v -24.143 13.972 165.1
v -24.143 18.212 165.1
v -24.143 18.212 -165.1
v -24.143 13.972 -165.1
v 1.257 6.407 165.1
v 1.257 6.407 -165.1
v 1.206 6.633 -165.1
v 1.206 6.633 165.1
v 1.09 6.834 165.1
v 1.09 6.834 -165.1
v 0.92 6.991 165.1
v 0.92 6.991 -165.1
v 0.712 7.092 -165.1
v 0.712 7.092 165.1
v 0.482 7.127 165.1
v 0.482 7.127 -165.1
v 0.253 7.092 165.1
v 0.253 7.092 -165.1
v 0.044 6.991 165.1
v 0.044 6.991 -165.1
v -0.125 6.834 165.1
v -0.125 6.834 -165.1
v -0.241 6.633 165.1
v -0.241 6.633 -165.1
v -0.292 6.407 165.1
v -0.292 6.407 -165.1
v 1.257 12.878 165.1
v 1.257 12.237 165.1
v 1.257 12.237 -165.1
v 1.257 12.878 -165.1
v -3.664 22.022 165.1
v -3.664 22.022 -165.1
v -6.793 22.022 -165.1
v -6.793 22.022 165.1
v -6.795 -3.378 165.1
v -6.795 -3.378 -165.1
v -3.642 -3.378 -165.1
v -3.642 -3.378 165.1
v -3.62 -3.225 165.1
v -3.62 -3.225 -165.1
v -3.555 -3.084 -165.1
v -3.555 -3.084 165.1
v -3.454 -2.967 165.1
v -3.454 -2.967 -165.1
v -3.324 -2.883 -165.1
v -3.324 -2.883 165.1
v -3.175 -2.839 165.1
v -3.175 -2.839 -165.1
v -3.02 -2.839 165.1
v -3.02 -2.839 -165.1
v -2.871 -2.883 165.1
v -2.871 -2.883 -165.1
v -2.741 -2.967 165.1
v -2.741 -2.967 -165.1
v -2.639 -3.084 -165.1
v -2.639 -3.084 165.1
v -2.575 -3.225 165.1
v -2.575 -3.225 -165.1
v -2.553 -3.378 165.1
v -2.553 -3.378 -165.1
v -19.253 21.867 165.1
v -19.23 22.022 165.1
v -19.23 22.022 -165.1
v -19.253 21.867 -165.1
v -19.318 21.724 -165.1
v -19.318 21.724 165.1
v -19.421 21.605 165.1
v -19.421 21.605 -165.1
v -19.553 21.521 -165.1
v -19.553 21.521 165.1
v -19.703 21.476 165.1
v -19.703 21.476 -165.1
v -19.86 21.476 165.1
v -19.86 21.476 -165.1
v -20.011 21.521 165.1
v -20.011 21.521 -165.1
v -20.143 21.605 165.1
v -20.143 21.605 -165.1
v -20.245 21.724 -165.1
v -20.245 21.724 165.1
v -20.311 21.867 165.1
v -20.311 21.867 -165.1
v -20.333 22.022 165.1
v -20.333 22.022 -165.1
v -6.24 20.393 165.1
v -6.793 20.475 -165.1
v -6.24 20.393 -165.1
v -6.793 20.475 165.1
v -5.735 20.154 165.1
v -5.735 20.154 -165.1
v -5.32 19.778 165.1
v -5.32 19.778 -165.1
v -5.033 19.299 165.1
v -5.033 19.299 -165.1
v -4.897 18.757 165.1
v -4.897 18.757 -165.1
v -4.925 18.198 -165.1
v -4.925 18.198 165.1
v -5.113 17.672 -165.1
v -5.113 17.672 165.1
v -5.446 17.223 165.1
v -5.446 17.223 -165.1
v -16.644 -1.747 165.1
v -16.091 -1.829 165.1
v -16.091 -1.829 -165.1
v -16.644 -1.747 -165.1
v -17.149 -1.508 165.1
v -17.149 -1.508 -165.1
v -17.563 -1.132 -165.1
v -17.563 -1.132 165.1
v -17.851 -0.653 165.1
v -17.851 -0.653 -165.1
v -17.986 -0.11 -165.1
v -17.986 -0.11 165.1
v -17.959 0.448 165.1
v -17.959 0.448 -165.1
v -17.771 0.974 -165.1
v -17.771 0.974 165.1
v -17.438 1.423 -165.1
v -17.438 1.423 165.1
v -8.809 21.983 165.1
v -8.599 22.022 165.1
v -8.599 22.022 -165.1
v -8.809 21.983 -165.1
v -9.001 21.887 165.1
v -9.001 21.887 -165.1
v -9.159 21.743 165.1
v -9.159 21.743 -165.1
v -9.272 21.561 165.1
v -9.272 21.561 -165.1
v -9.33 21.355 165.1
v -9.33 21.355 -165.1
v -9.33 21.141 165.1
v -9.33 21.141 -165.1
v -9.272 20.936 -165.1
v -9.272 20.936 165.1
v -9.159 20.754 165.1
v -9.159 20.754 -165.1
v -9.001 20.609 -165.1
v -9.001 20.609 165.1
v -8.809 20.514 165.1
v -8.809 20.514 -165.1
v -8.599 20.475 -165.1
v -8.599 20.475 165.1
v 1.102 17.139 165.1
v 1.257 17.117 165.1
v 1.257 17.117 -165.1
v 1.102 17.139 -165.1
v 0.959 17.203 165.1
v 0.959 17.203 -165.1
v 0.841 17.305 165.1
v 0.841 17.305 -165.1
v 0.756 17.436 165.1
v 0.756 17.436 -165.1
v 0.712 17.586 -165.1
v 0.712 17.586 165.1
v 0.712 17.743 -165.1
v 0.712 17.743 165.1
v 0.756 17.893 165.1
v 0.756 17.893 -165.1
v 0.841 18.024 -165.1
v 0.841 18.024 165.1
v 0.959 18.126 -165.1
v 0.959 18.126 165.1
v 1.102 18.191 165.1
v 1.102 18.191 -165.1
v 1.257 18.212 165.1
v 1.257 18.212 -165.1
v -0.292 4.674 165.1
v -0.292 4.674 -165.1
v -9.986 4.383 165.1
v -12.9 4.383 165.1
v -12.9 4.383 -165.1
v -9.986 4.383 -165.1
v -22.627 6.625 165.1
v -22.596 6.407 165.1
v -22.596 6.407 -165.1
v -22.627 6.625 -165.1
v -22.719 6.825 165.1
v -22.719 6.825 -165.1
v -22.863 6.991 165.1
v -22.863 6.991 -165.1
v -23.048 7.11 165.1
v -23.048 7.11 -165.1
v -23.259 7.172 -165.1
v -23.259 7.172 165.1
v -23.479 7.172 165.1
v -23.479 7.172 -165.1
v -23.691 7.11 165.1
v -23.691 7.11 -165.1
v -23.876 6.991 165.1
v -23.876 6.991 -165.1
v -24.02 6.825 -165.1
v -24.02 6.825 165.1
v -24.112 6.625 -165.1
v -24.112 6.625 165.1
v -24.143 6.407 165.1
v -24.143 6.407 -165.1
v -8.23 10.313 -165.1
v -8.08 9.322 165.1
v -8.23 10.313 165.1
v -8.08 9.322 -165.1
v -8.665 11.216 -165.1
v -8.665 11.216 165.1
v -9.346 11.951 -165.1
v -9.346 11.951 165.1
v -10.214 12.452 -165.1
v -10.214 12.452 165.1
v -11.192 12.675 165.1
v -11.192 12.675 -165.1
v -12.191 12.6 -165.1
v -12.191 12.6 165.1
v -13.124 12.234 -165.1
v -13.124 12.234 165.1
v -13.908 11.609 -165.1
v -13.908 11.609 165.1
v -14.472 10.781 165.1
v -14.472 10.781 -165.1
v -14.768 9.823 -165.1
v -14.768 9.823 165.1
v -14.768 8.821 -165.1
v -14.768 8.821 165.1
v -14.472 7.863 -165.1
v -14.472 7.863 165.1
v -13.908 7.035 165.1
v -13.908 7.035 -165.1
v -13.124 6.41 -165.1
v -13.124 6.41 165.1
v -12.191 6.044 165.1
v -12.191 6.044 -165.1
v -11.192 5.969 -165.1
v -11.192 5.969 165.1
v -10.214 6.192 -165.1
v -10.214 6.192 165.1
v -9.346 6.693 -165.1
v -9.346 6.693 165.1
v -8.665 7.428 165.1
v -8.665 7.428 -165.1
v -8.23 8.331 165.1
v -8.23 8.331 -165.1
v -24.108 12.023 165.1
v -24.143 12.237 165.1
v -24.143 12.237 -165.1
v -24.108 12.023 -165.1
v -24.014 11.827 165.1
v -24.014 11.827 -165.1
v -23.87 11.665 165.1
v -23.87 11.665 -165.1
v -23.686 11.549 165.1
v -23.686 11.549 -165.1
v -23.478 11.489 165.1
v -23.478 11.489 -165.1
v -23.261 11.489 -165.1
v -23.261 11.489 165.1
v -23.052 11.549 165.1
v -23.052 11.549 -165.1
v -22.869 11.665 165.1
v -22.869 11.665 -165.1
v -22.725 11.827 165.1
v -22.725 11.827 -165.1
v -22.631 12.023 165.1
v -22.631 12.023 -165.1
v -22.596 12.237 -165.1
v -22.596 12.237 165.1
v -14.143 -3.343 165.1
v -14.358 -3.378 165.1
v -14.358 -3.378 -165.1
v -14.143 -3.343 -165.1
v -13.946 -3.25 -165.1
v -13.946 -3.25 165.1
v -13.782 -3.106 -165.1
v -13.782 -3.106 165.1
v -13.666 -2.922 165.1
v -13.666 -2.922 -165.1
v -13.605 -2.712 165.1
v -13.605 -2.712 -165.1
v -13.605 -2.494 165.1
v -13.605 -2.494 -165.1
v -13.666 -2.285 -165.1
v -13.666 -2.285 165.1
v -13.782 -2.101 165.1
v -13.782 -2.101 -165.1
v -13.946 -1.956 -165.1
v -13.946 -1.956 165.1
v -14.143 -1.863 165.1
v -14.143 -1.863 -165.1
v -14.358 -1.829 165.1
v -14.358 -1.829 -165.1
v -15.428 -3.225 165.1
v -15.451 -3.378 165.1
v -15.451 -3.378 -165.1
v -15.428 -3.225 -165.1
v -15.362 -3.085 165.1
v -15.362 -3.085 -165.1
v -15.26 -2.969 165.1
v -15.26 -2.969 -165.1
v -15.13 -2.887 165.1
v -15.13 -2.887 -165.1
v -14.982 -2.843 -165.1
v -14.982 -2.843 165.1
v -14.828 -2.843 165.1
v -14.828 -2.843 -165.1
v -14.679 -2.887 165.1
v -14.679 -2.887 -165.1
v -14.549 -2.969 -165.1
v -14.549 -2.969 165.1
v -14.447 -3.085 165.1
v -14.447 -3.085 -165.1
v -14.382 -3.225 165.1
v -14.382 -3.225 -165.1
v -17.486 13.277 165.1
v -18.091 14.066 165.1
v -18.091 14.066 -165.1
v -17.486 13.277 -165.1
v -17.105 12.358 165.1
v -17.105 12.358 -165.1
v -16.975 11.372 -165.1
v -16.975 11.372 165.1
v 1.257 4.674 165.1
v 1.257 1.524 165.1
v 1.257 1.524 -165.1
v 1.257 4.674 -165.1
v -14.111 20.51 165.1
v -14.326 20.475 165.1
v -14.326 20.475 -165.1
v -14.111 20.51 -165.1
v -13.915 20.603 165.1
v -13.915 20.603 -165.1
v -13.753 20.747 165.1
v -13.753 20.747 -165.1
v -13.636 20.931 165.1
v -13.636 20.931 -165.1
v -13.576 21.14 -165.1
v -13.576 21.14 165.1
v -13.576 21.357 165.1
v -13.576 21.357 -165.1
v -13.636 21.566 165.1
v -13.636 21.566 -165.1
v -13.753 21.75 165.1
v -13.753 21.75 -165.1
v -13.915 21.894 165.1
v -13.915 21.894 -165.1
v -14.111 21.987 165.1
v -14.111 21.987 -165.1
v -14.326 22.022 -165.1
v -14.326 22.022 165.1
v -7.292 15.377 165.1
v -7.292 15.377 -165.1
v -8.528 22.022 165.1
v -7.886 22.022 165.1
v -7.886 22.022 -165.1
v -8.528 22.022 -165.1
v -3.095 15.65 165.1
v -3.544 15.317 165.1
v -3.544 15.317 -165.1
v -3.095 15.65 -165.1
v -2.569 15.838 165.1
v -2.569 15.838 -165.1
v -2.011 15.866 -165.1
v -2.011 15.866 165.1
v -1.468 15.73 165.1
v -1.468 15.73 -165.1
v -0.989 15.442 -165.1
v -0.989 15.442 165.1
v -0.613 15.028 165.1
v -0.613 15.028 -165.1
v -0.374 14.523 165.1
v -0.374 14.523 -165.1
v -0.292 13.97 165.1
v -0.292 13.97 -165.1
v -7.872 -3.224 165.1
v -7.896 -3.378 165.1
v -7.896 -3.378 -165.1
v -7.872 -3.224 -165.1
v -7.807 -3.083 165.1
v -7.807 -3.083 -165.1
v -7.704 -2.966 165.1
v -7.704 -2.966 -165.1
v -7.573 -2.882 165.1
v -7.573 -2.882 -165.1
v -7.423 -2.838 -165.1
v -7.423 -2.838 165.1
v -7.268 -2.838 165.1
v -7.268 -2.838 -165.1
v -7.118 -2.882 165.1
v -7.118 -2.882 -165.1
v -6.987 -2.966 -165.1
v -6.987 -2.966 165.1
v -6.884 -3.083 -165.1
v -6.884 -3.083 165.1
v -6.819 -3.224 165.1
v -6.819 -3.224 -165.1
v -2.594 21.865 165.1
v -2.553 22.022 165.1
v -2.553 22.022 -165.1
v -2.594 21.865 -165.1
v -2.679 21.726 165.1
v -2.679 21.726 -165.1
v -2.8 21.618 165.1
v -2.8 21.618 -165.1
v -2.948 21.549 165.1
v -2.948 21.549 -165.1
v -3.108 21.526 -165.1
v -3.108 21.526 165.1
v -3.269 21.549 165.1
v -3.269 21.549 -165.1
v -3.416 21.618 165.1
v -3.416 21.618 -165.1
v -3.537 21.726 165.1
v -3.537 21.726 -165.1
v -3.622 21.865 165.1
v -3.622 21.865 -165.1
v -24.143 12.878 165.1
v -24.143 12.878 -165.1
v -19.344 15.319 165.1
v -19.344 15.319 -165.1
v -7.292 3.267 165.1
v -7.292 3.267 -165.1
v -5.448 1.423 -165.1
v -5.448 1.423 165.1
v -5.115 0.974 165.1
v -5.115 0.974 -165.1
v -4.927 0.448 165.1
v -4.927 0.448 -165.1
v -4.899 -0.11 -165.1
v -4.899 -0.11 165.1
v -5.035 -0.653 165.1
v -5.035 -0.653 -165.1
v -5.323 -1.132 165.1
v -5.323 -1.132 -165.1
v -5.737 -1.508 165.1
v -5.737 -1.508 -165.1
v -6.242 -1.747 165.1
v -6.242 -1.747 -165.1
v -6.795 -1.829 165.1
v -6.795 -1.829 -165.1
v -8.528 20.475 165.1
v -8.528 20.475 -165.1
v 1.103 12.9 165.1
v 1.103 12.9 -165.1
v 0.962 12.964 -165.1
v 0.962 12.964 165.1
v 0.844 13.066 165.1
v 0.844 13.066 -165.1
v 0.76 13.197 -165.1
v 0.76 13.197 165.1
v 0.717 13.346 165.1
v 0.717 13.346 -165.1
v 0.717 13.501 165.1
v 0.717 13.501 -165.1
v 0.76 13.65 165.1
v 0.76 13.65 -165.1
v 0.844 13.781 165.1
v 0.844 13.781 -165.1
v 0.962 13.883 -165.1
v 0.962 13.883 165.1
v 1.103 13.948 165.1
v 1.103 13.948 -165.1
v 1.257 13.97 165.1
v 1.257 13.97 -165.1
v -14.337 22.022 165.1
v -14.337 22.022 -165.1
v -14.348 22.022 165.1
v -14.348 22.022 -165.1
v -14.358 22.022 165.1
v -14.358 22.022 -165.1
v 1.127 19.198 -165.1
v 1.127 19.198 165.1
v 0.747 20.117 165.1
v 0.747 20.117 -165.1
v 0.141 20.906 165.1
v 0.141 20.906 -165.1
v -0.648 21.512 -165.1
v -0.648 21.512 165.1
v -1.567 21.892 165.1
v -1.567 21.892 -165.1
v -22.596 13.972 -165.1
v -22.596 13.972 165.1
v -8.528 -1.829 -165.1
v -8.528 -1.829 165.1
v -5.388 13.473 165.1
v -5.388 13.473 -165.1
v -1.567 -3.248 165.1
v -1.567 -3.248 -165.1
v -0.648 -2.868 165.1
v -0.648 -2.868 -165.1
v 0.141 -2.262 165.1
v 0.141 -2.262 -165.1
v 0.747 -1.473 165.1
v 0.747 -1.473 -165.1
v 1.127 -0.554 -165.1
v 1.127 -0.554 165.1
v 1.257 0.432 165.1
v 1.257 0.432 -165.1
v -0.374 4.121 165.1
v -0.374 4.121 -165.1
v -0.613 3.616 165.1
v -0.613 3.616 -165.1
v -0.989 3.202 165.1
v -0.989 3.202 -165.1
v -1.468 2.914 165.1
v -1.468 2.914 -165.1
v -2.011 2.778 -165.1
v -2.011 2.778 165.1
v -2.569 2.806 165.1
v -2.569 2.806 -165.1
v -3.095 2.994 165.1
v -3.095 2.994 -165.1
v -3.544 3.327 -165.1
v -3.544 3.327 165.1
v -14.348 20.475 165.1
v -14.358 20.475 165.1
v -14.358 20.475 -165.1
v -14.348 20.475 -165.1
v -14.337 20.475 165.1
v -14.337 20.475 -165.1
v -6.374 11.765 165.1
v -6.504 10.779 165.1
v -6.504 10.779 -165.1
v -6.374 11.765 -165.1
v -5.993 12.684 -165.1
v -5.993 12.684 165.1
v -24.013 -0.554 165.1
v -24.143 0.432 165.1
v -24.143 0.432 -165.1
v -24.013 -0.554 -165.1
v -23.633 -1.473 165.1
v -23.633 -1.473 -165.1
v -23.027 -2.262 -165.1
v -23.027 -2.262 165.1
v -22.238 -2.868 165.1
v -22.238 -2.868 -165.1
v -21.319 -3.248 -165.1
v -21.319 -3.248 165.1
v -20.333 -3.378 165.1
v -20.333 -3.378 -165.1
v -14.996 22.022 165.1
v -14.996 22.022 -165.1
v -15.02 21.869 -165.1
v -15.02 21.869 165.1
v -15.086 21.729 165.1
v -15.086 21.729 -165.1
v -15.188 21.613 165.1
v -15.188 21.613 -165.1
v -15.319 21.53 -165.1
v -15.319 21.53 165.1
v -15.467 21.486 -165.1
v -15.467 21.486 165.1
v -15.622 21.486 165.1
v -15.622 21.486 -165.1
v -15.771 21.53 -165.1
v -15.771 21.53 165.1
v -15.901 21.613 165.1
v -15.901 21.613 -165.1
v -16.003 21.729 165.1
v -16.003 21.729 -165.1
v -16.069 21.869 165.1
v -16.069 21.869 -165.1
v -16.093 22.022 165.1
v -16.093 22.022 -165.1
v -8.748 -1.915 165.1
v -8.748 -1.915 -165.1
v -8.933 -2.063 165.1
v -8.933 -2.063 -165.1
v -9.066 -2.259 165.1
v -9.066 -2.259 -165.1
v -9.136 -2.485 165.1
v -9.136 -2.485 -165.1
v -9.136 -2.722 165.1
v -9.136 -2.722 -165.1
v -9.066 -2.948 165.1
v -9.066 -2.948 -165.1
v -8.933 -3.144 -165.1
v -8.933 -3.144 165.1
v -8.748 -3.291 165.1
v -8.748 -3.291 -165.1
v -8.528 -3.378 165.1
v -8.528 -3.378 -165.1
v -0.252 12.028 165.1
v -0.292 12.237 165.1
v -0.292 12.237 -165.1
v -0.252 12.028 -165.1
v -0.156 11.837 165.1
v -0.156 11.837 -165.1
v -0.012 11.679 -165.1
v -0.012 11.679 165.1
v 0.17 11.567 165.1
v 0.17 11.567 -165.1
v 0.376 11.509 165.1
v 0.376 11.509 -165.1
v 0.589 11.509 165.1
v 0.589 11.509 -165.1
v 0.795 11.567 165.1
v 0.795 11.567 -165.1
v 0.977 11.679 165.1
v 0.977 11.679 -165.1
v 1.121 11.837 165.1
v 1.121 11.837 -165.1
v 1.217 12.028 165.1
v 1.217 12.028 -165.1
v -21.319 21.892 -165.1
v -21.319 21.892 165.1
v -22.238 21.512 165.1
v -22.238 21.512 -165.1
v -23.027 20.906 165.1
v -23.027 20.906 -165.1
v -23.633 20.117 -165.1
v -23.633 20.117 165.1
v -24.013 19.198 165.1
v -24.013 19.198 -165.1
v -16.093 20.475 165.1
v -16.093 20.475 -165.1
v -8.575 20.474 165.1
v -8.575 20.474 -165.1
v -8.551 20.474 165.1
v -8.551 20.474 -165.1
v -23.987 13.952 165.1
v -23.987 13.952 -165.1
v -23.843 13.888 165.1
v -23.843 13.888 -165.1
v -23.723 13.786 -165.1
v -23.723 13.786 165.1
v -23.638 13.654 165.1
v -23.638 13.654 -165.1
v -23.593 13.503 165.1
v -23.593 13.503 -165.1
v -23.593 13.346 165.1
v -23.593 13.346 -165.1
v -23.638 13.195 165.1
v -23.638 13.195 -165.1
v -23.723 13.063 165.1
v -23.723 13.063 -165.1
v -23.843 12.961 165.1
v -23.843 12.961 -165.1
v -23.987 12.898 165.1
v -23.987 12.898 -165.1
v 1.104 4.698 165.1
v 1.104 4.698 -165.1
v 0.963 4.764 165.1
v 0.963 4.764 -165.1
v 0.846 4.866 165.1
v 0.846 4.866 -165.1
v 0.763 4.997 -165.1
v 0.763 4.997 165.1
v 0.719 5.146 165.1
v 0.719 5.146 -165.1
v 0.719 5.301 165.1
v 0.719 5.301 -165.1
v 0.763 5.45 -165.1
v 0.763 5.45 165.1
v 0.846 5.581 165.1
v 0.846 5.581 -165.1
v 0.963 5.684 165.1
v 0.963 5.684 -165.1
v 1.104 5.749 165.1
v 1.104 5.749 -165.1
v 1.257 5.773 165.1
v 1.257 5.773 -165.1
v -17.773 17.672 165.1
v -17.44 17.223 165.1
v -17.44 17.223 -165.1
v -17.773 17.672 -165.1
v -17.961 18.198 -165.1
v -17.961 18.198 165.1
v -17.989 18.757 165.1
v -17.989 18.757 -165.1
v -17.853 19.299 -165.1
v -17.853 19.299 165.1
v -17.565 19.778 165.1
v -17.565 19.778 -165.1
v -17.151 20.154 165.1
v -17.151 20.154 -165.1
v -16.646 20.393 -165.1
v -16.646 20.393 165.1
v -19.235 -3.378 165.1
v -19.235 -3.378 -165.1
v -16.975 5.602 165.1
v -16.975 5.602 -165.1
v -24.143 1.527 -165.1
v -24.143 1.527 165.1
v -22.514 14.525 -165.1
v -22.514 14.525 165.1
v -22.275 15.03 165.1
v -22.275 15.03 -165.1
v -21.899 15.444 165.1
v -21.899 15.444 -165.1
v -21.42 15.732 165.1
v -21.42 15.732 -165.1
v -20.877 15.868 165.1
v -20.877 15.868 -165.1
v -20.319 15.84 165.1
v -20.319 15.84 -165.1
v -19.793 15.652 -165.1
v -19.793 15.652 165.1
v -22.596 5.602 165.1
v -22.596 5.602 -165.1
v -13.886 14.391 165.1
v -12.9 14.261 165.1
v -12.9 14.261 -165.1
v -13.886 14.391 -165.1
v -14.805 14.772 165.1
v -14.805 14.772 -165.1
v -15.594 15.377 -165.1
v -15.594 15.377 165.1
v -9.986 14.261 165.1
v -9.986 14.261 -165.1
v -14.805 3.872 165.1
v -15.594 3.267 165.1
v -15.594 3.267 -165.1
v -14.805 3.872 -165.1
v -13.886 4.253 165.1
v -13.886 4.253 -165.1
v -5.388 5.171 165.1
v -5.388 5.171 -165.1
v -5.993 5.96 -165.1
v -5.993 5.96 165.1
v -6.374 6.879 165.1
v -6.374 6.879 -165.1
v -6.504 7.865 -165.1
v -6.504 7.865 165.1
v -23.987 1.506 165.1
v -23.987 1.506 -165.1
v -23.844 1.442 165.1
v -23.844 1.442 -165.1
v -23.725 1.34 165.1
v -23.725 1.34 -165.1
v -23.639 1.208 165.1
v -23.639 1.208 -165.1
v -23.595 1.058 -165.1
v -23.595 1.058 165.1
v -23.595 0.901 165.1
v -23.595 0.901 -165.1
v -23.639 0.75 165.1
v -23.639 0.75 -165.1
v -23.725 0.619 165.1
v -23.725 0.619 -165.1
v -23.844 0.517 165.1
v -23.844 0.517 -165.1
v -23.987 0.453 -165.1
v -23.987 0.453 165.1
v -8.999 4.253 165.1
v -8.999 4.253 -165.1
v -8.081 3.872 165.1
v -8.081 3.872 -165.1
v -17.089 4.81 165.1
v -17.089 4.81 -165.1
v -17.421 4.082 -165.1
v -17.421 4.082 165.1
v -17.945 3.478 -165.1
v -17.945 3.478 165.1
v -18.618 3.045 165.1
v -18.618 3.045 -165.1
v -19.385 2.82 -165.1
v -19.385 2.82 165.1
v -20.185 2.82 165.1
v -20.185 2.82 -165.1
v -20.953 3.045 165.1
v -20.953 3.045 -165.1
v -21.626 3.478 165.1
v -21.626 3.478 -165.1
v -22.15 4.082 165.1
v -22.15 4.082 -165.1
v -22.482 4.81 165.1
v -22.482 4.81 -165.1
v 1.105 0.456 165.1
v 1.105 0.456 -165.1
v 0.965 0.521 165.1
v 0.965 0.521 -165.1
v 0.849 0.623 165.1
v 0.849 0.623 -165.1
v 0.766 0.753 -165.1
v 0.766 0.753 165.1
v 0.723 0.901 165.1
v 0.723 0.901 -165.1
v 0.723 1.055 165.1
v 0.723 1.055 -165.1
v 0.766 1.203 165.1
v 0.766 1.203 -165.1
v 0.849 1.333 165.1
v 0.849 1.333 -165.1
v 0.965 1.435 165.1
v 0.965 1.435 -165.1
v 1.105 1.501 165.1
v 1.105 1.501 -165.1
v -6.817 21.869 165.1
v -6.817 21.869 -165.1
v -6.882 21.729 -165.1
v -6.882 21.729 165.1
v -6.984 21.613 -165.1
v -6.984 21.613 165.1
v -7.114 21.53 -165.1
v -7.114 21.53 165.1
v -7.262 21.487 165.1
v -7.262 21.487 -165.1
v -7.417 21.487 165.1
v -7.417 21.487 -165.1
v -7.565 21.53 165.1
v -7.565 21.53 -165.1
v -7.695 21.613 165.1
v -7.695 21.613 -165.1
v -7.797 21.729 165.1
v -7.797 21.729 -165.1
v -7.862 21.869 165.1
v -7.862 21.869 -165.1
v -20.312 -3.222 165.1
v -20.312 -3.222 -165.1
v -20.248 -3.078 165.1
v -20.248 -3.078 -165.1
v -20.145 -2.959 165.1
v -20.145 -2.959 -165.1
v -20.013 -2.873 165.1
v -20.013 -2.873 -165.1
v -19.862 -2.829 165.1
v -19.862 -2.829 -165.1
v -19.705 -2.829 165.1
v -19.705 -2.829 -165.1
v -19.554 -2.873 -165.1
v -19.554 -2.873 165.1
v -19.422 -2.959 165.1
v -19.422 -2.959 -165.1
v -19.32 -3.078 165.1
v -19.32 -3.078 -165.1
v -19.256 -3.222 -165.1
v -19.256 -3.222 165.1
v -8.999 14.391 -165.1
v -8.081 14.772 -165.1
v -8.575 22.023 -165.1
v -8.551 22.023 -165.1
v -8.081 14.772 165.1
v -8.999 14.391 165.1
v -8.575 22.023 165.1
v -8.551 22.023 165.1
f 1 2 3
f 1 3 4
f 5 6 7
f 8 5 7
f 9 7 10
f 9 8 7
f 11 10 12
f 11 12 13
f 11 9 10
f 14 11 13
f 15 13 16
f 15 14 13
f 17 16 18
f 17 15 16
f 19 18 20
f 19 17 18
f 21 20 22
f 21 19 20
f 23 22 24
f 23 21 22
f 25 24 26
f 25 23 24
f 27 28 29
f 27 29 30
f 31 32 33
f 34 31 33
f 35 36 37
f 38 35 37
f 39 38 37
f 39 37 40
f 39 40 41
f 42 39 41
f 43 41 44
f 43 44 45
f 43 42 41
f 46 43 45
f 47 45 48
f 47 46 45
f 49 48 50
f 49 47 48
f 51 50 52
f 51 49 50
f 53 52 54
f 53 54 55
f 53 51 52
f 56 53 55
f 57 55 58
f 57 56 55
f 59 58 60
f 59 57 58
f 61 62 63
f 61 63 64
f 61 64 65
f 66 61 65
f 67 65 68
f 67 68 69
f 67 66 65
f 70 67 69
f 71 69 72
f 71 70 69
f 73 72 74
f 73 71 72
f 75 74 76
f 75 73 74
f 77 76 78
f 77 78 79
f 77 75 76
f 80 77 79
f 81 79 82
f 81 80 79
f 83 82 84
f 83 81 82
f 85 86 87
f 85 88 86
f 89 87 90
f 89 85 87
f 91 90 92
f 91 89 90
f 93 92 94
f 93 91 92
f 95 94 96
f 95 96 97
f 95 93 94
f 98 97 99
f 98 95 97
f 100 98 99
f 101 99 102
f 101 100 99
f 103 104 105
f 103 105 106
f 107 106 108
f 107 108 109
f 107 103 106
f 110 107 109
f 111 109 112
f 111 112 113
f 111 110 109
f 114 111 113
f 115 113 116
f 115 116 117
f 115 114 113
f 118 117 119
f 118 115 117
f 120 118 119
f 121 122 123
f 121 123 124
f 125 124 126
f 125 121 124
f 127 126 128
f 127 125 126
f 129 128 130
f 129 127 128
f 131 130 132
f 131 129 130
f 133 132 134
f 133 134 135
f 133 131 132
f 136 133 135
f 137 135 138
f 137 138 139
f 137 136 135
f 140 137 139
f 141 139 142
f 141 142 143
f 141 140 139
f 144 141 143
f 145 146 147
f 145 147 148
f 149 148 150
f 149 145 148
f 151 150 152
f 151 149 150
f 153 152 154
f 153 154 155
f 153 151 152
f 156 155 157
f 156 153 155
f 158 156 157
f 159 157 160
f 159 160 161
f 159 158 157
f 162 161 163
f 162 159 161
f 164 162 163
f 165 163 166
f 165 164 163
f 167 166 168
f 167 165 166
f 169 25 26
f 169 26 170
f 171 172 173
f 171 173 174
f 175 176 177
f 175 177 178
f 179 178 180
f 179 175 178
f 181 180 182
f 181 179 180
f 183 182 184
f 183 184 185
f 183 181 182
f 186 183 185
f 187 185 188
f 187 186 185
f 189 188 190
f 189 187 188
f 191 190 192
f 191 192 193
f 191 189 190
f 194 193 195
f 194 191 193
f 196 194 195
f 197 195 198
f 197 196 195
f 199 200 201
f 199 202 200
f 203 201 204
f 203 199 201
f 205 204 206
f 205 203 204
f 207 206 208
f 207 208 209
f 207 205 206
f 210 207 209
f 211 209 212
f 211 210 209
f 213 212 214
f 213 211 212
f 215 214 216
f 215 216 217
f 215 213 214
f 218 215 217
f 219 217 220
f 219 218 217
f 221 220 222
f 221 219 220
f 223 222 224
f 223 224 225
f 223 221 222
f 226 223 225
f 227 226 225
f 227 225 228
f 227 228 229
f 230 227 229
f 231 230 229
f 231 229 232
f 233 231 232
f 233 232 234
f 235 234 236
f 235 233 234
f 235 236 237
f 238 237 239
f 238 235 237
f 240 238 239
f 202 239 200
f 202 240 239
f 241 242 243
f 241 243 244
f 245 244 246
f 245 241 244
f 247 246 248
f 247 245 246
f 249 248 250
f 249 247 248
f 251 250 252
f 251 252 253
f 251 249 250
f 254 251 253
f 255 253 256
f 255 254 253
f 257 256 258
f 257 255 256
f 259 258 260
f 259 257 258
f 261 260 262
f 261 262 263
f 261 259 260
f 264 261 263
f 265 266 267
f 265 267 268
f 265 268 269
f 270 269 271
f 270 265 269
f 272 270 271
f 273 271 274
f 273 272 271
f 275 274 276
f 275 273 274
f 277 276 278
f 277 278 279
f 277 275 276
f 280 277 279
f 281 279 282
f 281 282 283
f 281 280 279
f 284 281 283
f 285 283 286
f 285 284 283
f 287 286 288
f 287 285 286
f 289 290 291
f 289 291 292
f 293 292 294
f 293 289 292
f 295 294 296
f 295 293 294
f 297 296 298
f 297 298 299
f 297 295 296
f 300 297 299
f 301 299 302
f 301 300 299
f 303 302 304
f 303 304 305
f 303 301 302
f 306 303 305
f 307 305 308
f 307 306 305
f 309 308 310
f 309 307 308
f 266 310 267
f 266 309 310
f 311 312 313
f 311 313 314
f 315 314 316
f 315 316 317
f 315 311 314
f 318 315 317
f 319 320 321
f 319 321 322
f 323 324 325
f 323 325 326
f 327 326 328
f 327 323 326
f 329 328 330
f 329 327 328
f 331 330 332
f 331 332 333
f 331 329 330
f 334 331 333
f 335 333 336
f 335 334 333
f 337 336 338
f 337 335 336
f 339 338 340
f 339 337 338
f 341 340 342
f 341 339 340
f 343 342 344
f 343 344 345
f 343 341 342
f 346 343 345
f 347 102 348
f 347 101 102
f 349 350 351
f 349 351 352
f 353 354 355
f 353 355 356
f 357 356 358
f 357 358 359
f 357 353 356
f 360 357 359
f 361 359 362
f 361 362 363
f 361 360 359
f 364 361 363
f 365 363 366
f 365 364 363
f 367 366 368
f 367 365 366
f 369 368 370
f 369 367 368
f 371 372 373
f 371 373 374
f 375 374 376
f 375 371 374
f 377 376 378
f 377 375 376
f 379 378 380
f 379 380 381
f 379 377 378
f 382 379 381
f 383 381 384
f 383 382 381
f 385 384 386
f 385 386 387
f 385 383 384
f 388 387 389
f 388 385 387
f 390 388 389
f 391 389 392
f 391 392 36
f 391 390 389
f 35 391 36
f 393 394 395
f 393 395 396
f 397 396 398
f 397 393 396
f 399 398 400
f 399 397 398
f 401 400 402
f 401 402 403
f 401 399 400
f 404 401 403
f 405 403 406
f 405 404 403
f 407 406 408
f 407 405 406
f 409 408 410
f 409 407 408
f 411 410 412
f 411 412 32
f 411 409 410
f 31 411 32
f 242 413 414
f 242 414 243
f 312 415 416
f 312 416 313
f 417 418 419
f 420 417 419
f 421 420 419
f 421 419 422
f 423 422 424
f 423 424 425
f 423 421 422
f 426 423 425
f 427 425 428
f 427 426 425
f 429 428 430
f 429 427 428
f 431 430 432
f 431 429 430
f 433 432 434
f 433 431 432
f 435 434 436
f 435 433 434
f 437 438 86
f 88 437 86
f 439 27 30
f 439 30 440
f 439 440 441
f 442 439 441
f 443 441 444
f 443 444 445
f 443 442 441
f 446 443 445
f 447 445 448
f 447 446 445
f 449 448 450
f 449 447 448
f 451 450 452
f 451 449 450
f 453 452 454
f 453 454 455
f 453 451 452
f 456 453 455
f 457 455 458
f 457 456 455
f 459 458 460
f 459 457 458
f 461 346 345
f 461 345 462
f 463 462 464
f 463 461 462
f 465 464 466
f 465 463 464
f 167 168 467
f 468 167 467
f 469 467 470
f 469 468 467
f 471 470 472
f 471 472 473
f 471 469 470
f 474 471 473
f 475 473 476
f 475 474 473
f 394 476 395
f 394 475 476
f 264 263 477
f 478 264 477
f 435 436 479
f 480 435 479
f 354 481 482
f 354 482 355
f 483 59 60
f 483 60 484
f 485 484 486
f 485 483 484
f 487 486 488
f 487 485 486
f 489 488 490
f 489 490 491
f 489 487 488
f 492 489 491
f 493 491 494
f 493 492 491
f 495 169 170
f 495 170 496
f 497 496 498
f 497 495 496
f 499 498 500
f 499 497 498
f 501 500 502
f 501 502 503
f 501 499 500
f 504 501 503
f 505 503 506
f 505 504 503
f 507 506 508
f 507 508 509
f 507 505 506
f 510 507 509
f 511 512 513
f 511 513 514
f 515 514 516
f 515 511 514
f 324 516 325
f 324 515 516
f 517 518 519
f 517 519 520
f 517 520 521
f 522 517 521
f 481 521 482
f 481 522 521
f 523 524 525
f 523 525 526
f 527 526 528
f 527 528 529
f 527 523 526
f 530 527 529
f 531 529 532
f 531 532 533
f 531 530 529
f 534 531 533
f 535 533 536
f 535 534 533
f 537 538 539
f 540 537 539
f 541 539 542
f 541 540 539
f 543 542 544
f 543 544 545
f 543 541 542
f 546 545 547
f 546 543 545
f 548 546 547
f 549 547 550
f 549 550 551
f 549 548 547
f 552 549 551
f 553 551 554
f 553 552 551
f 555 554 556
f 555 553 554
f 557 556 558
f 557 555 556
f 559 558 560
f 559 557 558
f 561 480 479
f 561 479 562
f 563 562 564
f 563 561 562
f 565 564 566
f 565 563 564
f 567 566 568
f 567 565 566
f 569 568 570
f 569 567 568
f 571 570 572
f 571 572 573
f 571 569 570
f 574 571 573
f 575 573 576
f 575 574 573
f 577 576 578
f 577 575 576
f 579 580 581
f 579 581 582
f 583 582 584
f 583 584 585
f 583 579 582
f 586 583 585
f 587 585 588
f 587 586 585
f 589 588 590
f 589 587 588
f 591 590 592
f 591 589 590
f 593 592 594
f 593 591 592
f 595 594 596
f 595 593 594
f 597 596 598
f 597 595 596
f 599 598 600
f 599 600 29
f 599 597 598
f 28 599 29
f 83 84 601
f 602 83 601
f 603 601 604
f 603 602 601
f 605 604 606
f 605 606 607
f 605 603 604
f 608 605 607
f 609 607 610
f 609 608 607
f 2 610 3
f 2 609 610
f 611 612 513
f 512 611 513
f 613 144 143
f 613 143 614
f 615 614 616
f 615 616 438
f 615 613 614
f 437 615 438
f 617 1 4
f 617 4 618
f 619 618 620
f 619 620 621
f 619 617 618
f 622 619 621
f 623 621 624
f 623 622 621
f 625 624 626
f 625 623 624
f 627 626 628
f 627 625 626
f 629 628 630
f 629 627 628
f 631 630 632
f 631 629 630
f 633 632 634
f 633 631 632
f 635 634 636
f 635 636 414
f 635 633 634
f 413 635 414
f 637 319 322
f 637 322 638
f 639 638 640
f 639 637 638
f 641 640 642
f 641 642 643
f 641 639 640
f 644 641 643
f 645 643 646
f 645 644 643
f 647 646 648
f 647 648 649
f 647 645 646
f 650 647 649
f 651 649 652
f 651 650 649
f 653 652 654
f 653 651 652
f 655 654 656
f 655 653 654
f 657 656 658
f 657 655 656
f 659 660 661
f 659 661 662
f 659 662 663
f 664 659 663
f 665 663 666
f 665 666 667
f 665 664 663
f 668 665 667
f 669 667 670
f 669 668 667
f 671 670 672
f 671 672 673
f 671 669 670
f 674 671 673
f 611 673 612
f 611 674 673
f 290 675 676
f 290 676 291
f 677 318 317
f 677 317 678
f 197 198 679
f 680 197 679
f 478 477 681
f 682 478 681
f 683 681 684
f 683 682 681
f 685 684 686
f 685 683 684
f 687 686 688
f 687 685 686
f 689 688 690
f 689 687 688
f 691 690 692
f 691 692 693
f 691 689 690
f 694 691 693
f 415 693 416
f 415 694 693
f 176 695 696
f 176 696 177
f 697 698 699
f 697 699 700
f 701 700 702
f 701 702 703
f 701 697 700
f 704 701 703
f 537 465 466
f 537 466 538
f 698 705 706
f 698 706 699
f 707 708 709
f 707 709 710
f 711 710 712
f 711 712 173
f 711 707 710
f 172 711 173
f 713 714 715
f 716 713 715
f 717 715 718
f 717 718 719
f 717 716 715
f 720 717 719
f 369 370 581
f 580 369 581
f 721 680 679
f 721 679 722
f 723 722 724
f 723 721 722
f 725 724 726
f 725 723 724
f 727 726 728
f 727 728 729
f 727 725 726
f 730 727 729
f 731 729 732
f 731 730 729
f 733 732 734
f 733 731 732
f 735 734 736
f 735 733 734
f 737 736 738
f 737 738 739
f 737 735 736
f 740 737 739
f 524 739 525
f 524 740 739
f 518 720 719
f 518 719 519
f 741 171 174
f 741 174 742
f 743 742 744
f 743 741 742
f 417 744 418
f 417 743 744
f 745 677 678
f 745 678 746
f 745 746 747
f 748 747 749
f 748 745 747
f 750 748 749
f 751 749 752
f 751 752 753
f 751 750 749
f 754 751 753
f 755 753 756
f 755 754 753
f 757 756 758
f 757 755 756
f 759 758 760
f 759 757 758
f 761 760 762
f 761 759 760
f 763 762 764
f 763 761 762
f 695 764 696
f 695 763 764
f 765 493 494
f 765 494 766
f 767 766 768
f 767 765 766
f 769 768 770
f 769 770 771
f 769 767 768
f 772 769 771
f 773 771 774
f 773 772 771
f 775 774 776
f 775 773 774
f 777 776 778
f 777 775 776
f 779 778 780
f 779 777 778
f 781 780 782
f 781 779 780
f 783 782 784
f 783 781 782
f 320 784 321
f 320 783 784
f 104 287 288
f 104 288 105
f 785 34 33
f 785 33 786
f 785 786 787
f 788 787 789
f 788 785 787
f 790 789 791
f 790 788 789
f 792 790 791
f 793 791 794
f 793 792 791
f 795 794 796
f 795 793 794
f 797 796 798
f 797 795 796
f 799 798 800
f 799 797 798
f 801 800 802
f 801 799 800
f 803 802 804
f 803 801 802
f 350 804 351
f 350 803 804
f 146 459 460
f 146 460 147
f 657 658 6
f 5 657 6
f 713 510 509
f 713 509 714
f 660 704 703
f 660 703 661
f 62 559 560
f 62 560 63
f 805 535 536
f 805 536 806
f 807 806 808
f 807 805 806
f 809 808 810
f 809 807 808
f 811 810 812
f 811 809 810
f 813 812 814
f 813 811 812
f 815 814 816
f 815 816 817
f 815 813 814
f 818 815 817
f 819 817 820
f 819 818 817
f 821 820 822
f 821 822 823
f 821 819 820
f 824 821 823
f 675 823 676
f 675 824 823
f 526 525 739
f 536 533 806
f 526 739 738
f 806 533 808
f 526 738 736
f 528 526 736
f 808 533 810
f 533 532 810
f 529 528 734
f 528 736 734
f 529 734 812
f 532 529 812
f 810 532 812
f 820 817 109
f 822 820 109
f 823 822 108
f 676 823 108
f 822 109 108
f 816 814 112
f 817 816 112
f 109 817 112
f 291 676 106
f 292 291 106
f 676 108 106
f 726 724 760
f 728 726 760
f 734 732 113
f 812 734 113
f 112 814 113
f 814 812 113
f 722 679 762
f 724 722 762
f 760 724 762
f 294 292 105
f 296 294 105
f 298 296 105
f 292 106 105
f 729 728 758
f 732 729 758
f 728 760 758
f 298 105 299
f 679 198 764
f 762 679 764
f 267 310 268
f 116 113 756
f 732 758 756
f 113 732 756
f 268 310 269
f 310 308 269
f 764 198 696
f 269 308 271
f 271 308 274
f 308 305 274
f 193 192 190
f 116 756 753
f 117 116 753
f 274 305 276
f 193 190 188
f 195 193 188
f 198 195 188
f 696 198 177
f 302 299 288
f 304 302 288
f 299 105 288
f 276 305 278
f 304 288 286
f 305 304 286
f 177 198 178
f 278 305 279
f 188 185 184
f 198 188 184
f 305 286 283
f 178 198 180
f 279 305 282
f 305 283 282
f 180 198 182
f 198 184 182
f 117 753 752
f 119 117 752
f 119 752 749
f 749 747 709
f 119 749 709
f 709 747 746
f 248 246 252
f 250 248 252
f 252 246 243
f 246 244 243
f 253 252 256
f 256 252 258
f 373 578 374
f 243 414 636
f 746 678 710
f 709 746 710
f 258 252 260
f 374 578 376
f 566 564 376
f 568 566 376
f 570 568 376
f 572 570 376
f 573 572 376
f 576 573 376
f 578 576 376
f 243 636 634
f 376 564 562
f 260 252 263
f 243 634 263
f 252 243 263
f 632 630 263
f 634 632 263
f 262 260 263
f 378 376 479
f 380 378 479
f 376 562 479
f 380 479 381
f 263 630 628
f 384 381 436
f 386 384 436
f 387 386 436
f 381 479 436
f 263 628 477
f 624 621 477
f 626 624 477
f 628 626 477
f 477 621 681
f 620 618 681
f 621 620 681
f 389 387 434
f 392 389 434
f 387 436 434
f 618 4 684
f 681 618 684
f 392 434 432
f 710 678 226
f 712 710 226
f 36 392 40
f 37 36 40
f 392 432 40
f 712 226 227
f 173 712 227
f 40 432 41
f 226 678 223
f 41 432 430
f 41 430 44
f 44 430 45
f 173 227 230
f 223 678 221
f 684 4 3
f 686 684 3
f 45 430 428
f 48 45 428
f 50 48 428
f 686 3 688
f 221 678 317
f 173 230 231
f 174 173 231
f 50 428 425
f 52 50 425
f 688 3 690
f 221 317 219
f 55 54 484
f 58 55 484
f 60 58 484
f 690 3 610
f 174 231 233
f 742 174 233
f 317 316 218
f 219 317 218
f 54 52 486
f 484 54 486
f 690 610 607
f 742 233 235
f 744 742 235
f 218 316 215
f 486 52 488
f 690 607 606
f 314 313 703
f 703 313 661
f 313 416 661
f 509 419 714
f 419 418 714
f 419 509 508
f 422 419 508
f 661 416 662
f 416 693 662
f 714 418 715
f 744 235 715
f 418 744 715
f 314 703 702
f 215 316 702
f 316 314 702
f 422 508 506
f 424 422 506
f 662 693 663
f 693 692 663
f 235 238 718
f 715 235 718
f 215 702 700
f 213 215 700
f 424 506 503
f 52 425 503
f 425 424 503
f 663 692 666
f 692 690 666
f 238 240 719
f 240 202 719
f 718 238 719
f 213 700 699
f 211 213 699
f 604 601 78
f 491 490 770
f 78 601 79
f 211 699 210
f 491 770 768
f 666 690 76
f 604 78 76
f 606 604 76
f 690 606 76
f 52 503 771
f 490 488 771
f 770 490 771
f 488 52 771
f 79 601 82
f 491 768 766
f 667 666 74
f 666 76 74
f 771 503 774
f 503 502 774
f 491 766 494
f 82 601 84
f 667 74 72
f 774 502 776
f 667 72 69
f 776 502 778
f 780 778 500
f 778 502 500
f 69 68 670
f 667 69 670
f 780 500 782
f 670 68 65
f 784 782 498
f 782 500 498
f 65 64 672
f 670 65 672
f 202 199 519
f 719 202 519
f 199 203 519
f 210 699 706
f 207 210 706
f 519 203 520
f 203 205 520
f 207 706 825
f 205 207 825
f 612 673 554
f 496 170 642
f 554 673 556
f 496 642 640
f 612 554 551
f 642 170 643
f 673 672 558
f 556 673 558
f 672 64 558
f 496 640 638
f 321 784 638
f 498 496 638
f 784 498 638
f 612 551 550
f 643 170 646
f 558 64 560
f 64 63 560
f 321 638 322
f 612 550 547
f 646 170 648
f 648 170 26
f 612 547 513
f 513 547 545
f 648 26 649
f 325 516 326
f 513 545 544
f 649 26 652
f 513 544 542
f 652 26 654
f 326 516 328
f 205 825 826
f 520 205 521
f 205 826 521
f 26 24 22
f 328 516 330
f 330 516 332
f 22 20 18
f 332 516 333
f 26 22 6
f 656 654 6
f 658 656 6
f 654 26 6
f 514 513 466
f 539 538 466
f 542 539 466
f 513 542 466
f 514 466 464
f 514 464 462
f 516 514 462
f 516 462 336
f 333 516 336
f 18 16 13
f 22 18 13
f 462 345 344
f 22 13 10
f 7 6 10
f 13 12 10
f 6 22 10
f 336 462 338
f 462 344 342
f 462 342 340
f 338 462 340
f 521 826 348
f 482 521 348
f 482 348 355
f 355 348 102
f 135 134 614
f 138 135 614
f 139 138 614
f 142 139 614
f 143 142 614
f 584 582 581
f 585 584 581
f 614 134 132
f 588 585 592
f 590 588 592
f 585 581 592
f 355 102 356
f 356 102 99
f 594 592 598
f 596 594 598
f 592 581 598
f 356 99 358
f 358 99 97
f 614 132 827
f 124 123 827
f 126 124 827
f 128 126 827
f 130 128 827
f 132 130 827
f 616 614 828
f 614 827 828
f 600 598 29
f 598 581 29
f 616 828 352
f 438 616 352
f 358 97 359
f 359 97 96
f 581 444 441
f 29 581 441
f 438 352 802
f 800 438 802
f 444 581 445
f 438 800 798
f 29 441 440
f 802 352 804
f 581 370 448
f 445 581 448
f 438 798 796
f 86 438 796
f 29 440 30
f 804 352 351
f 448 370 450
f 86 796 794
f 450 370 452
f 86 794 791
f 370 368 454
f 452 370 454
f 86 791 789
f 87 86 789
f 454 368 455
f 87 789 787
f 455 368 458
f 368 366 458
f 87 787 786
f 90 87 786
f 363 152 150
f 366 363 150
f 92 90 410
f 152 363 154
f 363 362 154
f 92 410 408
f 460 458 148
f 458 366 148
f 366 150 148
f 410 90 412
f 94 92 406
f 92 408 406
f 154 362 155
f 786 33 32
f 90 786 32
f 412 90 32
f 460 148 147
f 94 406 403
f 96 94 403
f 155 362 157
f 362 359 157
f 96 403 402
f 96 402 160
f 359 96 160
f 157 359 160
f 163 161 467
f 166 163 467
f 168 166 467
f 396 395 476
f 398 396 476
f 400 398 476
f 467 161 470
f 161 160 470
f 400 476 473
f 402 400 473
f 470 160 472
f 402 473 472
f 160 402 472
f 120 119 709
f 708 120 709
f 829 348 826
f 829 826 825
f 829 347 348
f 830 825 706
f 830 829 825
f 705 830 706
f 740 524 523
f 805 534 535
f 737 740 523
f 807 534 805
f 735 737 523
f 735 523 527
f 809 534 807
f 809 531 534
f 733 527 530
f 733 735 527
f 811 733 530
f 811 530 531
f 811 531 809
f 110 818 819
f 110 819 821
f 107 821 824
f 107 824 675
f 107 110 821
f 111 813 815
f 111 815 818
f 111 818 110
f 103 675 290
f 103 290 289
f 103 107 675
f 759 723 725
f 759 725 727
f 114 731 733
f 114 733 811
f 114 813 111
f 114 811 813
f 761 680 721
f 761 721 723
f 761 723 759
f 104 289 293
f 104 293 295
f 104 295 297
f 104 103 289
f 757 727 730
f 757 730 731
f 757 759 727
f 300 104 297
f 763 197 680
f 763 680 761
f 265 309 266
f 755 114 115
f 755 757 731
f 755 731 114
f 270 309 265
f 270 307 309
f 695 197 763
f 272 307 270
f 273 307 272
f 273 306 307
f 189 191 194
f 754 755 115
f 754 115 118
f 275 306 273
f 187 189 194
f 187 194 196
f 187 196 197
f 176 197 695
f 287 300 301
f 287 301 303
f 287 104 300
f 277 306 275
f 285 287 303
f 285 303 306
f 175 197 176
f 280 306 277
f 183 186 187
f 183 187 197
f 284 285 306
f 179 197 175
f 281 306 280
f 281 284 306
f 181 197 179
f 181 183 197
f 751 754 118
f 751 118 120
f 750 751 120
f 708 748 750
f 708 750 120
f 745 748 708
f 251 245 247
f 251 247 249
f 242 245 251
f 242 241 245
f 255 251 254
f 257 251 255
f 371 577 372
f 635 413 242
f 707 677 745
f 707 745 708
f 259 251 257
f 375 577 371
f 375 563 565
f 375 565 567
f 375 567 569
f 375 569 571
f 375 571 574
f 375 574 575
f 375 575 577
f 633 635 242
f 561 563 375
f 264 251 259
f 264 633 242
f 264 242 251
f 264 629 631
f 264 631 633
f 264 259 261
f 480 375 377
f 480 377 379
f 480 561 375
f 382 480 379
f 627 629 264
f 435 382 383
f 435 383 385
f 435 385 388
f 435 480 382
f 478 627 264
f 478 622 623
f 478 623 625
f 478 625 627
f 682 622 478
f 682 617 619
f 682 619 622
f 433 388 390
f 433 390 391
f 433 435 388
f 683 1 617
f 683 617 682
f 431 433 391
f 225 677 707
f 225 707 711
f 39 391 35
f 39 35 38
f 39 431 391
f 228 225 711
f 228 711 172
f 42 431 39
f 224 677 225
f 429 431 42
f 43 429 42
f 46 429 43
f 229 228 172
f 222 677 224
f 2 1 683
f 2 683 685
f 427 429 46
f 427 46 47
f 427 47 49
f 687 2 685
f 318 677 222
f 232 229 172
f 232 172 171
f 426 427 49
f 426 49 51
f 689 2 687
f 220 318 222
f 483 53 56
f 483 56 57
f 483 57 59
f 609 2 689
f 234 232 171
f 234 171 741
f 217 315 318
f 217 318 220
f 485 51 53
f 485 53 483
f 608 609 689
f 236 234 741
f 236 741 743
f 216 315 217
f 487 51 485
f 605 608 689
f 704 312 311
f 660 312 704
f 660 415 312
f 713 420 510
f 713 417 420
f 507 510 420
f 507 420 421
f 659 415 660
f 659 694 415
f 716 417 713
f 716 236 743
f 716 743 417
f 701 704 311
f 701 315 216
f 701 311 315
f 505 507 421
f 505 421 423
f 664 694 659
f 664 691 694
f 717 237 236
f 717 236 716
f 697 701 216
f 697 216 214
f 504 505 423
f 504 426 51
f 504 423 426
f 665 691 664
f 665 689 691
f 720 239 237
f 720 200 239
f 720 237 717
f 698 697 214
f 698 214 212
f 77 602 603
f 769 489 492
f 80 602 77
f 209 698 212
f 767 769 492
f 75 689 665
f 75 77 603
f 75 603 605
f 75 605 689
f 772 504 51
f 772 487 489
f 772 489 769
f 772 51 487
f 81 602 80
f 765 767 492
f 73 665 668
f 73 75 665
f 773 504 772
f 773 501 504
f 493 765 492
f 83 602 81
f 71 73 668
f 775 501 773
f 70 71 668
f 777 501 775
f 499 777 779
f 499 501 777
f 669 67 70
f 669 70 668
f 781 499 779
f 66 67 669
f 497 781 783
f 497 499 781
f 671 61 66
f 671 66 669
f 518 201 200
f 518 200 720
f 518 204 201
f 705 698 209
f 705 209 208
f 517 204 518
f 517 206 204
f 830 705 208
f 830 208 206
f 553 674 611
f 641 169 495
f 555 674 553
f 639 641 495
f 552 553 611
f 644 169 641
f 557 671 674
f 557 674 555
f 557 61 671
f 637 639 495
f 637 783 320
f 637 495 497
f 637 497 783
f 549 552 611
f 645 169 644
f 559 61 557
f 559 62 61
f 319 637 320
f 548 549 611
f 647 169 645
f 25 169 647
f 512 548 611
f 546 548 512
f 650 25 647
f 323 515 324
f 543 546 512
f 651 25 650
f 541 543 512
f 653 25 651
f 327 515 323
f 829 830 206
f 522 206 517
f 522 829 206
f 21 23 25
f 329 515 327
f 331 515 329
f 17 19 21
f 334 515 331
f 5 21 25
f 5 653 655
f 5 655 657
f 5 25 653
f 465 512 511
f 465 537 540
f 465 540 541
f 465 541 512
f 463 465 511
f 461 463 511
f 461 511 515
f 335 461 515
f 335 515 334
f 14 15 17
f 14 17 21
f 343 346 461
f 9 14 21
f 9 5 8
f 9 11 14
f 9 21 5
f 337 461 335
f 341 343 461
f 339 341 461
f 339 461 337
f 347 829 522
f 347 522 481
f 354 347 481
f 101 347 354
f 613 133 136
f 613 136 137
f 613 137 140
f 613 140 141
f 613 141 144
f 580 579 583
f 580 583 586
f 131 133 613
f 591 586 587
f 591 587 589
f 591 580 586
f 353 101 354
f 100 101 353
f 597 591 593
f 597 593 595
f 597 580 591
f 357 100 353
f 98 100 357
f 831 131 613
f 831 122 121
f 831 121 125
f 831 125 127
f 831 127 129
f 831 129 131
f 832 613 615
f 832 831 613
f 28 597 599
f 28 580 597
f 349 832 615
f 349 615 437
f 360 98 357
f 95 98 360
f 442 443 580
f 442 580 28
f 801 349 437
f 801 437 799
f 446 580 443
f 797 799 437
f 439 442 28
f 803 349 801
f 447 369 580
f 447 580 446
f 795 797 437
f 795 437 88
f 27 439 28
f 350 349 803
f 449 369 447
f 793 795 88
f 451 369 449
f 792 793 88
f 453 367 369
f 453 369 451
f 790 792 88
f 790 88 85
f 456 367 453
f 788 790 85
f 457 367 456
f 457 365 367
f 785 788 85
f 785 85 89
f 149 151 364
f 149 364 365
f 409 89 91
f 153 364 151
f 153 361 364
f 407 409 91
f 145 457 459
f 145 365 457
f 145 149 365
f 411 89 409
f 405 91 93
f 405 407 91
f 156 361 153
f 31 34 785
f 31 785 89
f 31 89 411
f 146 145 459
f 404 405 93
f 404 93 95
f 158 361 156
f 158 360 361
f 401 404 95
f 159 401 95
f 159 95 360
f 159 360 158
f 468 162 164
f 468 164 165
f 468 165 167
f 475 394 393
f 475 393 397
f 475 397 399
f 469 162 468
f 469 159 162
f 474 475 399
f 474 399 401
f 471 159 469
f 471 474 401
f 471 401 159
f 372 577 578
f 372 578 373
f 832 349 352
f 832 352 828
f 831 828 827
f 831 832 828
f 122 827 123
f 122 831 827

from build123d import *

# Parameters (mm, degrees)
F0_R     = 3.362501
F1_DEPTH = 165.1


with BuildPart() as f1:
    # F0 (on Top) → F1 (new body, symmetric)
    with BuildSketch(Plane.XY):
        with BuildLine():
            ThreePointArc((-7.291522, 15.377258), (-8.527575, 14.551354), (-9.985599, 14.261335))
            Line((-9.985599, 14.261335), (-12.900292, 14.261335))
            ThreePointArc((-12.900292, 14.261335), (-14.358316, 14.551354), (-15.594369, 15.377258))
            Line((-15.594369, 15.377258), (-17.43985, 17.222739))
            ThreePointArc((-17.43985, 17.222739), (-17.852803, 19.29879), (-16.092812, 20.474778))
            Line((-16.092812, 20.474778), (-14.358316, 20.474778))
            Line((-14.358316, 20.474778), (-14.325965, 20.474778))
            ThreePointArc((-14.325965, 20.474778), (-13.56835, 21.248399), (-14.325965, 22.02202))
            Line((-14.325965, 22.02202), (-14.358316, 22.02202))
            Line((-14.358316, 22.02202), (-14.996286, 22.02202))
            ThreePointArc((-14.996286, 22.02202), (-15.544549, 21.480792), (-16.092812, 22.02202))
            Line((-16.092812, 22.02202), (-19.230427, 22.02202))
            ThreePointArc((-19.230427, 22.02202), (-19.781686, 21.470761), (-20.332945, 22.02202))
            ThreePointArc((-20.332945, 22.02202), (-23.027022, 20.906097), (-24.142945, 18.21202))
            Line((-24.142945, 18.21202), (-24.142945, 17.126744))
            Line((-24.142945, 17.126744), (-24.142945, 13.971887))
            ThreePointArc((-24.142945, 13.971887), (-23.587106, 13.424695), (-24.142945, 12.877503))
            Line((-24.142945, 12.877503), (-24.142945, 12.23739))
            ThreePointArc((-24.142945, 12.23739), (-23.369324, 11.481574), (-22.595703, 12.23739))
            Line((-22.595703, 12.23739), (-22.595703, 13.971887))
            ThreePointArc((-22.595703, 13.971887), (-21.419715, 15.731877), (-19.343665, 15.318925))
            Line((-19.343665, 15.318925), (-18.091092, 14.066352))
            ThreePointArc((-18.091092, 14.066352), (-17.265188, 12.830299), (-16.975169, 11.372275))
            Line((-16.975169, 11.372275), (-16.975169, 5.601584))
            ThreePointArc((-16.975169, 5.601584), (-19.785436, 2.791317), (-22.595703, 5.601584))
            Line((-22.595703, 5.601584), (-22.595703, 6.406649))
            ThreePointArc((-22.595703, 6.406649), (-23.369324, 7.18027), (-24.142945, 6.406649))
            Line((-24.142945, 6.406649), (-24.142945, 5.771259))
            Line((-24.142945, 5.771259), (-24.142945, 1.526558))
            ThreePointArc((-24.142945, 1.526558), (-23.589161, 0.979289), (-24.142945, 0.43202))
            ThreePointArc((-24.142945, 0.43202), (-23.027022, -2.262057), (-20.332945, -3.37798))
            ThreePointArc((-20.332945, -3.37798), (-19.783762, -2.823095), (-19.234579, -3.37798))
            Line((-19.234579, -3.37798), (-15.451114, -3.37798))
            ThreePointArc((-15.451114, -3.37798), (-14.904715, -2.837846), (-14.358316, -3.37798))
            ThreePointArc((-14.358316, -3.37798), (-13.597129, -2.60328), (-14.358316, -1.82858))
            Line((-14.358316, -1.82858), (-16.090654, -1.82858))
            ThreePointArc((-16.090654, -1.82858), (-17.850645, -0.652592), (-17.437693, 1.423458))
            Line((-17.437693, 1.423458), (-15.594369, 3.266782))
            ThreePointArc((-15.594369, 3.266782), (-14.358316, 4.092686), (-12.900292, 4.382705))
            Line((-12.900292, 4.382705), (-9.985599, 4.382705))
            ThreePointArc((-9.985599, 4.382705), (-8.527575, 4.092686), (-7.291522, 3.266782))
            Line((-7.291522, 3.266782), (-5.448198, 1.423458))
            ThreePointArc((-5.448198, 1.423458), (-5.035246, -0.652592), (-6.795236, -1.82858))
            Line((-6.795236, -1.82858), (-8.527575, -1.82858))
            ThreePointArc((-8.527575, -1.82858), (-9.144781, -2.60328), (-8.527575, -3.37798))
            Line((-8.527575, -3.37798), (-7.895813, -3.37798))
            ThreePointArc((-7.895813, -3.37798), (-7.345525, -2.832718), (-6.795236, -3.37798))
            Line((-6.795236, -3.37798), (-3.641811, -3.37798))
            ThreePointArc((-3.641811, -3.37798), (-3.097378, -2.833547), (-2.552945, -3.37798))
            ThreePointArc((-2.552945, -3.37798), (0.141132, -2.262057), (1.257055, 0.43202))
            ThreePointArc((1.257055, 0.43202), (0.717674, 0.97812), (1.257055, 1.52422))
            Line((1.257055, 1.52422), (1.257055, 4.674311))
            ThreePointArc((1.257055, 4.674311), (0.713538, 5.22368), (1.257055, 5.773049))
            Line((1.257055, 5.773049), (1.257055, 6.406649))
            ThreePointArc((1.257055, 6.406649), (0.482355, 7.126711), (-0.292345, 6.406649))
            Line((-0.292345, 6.406649), (-0.292345, 4.674311))
            ThreePointArc((-0.292345, 4.674311), (-1.468333, 2.91432), (-3.544384, 3.327273))
            Line((-3.544384, 3.327273), (-5.387707, 5.170596))
            ThreePointArc((-5.387707, 5.170596), (-6.213612, 6.406649), (-6.503631, 7.864673))
            Line((-6.503631, 7.864673), (-6.503631, 10.779367))
            ThreePointArc((-6.503631, 10.779367), (-6.213612, 12.23739), (-5.387707, 13.473443))
            Line((-5.387707, 13.473443), (-3.544384, 15.316767))
            ThreePointArc((-3.544384, 15.316767), (-1.468333, 15.729719), (-0.292345, 13.969729))
            Line((-0.292345, 13.969729), (-0.292345, 12.23739))
            ThreePointArc((-0.292345, 12.23739), (0.482355, 11.501425), (1.257055, 12.23739))
            Line((1.257055, 12.23739), (1.257055, 12.877529))
            ThreePointArc((1.257055, 12.877529), (0.710955, 13.423629), (1.257055, 13.969729))
            Line((1.257055, 13.969729), (1.257055, 17.117185))
            ThreePointArc((1.257055, 17.117185), (0.705999, 17.664602), (1.257055, 18.21202))
            ThreePointArc((1.257055, 18.21202), (0.141132, 20.906097), (-2.552945, 22.02202))
            ThreePointArc((-2.552945, 22.02202), (-3.108248, 21.525639), (-3.663551, 22.02202))
            Line((-3.663551, 22.02202), (-6.793078, 22.02202))
            ThreePointArc((-6.793078, 22.02202), (-7.33931, 21.481453), (-7.885542, 22.02202))
            Line((-7.885542, 22.02202), (-8.527575, 22.02202))
            Line((-8.527575, 22.02202), (-8.599148, 22.02202))
            ThreePointArc((-8.599148, 22.02202), (-9.33781, 21.248399), (-8.599148, 20.474778))
            Line((-8.599148, 20.474778), (-8.527575, 20.474778))
            Line((-8.527575, 20.474778), (-6.793078, 20.474778))
            ThreePointArc((-6.793078, 20.474778), (-5.033088, 19.29879), (-5.44604, 17.222739))
            Line((-5.44604, 17.222739), (-7.291522, 15.377258))
        make_face()
        with Locations((-11.442945, 9.32202)):
            Circle(F0_R, mode=Mode.SUBTRACT)
        with BuildLine():
            ThreePointArc((-8.599148, 20.474778), (-8.563361, 20.473951), (-8.527575, 20.474778))
            Line((-8.527575, 20.474778), (-8.599148, 20.474778))
        make_face()
        with BuildLine():
            Line((-14.325965, 20.474778), (-14.358316, 20.474778))
            ThreePointArc((-14.358316, 20.474778), (-14.34214, 20.474609), (-14.325965, 20.474778))
        make_face()
        with BuildLine():
            ThreePointArc((-8.527575, 22.02202), (-8.563361, 22.022847), (-8.599148, 22.02202))
            Line((-8.599148, 22.02202), (-8.527575, 22.02202))
        make_face()
        with BuildLine():
            Line((-14.358316, 22.02202), (-14.325965, 22.02202))
            ThreePointArc((-14.325965, 22.02202), (-14.34214, 22.022189), (-14.358316, 22.02202))
        make_face()
    extrude(amount=F1_DEPTH, both=True)


solid = f1.part
